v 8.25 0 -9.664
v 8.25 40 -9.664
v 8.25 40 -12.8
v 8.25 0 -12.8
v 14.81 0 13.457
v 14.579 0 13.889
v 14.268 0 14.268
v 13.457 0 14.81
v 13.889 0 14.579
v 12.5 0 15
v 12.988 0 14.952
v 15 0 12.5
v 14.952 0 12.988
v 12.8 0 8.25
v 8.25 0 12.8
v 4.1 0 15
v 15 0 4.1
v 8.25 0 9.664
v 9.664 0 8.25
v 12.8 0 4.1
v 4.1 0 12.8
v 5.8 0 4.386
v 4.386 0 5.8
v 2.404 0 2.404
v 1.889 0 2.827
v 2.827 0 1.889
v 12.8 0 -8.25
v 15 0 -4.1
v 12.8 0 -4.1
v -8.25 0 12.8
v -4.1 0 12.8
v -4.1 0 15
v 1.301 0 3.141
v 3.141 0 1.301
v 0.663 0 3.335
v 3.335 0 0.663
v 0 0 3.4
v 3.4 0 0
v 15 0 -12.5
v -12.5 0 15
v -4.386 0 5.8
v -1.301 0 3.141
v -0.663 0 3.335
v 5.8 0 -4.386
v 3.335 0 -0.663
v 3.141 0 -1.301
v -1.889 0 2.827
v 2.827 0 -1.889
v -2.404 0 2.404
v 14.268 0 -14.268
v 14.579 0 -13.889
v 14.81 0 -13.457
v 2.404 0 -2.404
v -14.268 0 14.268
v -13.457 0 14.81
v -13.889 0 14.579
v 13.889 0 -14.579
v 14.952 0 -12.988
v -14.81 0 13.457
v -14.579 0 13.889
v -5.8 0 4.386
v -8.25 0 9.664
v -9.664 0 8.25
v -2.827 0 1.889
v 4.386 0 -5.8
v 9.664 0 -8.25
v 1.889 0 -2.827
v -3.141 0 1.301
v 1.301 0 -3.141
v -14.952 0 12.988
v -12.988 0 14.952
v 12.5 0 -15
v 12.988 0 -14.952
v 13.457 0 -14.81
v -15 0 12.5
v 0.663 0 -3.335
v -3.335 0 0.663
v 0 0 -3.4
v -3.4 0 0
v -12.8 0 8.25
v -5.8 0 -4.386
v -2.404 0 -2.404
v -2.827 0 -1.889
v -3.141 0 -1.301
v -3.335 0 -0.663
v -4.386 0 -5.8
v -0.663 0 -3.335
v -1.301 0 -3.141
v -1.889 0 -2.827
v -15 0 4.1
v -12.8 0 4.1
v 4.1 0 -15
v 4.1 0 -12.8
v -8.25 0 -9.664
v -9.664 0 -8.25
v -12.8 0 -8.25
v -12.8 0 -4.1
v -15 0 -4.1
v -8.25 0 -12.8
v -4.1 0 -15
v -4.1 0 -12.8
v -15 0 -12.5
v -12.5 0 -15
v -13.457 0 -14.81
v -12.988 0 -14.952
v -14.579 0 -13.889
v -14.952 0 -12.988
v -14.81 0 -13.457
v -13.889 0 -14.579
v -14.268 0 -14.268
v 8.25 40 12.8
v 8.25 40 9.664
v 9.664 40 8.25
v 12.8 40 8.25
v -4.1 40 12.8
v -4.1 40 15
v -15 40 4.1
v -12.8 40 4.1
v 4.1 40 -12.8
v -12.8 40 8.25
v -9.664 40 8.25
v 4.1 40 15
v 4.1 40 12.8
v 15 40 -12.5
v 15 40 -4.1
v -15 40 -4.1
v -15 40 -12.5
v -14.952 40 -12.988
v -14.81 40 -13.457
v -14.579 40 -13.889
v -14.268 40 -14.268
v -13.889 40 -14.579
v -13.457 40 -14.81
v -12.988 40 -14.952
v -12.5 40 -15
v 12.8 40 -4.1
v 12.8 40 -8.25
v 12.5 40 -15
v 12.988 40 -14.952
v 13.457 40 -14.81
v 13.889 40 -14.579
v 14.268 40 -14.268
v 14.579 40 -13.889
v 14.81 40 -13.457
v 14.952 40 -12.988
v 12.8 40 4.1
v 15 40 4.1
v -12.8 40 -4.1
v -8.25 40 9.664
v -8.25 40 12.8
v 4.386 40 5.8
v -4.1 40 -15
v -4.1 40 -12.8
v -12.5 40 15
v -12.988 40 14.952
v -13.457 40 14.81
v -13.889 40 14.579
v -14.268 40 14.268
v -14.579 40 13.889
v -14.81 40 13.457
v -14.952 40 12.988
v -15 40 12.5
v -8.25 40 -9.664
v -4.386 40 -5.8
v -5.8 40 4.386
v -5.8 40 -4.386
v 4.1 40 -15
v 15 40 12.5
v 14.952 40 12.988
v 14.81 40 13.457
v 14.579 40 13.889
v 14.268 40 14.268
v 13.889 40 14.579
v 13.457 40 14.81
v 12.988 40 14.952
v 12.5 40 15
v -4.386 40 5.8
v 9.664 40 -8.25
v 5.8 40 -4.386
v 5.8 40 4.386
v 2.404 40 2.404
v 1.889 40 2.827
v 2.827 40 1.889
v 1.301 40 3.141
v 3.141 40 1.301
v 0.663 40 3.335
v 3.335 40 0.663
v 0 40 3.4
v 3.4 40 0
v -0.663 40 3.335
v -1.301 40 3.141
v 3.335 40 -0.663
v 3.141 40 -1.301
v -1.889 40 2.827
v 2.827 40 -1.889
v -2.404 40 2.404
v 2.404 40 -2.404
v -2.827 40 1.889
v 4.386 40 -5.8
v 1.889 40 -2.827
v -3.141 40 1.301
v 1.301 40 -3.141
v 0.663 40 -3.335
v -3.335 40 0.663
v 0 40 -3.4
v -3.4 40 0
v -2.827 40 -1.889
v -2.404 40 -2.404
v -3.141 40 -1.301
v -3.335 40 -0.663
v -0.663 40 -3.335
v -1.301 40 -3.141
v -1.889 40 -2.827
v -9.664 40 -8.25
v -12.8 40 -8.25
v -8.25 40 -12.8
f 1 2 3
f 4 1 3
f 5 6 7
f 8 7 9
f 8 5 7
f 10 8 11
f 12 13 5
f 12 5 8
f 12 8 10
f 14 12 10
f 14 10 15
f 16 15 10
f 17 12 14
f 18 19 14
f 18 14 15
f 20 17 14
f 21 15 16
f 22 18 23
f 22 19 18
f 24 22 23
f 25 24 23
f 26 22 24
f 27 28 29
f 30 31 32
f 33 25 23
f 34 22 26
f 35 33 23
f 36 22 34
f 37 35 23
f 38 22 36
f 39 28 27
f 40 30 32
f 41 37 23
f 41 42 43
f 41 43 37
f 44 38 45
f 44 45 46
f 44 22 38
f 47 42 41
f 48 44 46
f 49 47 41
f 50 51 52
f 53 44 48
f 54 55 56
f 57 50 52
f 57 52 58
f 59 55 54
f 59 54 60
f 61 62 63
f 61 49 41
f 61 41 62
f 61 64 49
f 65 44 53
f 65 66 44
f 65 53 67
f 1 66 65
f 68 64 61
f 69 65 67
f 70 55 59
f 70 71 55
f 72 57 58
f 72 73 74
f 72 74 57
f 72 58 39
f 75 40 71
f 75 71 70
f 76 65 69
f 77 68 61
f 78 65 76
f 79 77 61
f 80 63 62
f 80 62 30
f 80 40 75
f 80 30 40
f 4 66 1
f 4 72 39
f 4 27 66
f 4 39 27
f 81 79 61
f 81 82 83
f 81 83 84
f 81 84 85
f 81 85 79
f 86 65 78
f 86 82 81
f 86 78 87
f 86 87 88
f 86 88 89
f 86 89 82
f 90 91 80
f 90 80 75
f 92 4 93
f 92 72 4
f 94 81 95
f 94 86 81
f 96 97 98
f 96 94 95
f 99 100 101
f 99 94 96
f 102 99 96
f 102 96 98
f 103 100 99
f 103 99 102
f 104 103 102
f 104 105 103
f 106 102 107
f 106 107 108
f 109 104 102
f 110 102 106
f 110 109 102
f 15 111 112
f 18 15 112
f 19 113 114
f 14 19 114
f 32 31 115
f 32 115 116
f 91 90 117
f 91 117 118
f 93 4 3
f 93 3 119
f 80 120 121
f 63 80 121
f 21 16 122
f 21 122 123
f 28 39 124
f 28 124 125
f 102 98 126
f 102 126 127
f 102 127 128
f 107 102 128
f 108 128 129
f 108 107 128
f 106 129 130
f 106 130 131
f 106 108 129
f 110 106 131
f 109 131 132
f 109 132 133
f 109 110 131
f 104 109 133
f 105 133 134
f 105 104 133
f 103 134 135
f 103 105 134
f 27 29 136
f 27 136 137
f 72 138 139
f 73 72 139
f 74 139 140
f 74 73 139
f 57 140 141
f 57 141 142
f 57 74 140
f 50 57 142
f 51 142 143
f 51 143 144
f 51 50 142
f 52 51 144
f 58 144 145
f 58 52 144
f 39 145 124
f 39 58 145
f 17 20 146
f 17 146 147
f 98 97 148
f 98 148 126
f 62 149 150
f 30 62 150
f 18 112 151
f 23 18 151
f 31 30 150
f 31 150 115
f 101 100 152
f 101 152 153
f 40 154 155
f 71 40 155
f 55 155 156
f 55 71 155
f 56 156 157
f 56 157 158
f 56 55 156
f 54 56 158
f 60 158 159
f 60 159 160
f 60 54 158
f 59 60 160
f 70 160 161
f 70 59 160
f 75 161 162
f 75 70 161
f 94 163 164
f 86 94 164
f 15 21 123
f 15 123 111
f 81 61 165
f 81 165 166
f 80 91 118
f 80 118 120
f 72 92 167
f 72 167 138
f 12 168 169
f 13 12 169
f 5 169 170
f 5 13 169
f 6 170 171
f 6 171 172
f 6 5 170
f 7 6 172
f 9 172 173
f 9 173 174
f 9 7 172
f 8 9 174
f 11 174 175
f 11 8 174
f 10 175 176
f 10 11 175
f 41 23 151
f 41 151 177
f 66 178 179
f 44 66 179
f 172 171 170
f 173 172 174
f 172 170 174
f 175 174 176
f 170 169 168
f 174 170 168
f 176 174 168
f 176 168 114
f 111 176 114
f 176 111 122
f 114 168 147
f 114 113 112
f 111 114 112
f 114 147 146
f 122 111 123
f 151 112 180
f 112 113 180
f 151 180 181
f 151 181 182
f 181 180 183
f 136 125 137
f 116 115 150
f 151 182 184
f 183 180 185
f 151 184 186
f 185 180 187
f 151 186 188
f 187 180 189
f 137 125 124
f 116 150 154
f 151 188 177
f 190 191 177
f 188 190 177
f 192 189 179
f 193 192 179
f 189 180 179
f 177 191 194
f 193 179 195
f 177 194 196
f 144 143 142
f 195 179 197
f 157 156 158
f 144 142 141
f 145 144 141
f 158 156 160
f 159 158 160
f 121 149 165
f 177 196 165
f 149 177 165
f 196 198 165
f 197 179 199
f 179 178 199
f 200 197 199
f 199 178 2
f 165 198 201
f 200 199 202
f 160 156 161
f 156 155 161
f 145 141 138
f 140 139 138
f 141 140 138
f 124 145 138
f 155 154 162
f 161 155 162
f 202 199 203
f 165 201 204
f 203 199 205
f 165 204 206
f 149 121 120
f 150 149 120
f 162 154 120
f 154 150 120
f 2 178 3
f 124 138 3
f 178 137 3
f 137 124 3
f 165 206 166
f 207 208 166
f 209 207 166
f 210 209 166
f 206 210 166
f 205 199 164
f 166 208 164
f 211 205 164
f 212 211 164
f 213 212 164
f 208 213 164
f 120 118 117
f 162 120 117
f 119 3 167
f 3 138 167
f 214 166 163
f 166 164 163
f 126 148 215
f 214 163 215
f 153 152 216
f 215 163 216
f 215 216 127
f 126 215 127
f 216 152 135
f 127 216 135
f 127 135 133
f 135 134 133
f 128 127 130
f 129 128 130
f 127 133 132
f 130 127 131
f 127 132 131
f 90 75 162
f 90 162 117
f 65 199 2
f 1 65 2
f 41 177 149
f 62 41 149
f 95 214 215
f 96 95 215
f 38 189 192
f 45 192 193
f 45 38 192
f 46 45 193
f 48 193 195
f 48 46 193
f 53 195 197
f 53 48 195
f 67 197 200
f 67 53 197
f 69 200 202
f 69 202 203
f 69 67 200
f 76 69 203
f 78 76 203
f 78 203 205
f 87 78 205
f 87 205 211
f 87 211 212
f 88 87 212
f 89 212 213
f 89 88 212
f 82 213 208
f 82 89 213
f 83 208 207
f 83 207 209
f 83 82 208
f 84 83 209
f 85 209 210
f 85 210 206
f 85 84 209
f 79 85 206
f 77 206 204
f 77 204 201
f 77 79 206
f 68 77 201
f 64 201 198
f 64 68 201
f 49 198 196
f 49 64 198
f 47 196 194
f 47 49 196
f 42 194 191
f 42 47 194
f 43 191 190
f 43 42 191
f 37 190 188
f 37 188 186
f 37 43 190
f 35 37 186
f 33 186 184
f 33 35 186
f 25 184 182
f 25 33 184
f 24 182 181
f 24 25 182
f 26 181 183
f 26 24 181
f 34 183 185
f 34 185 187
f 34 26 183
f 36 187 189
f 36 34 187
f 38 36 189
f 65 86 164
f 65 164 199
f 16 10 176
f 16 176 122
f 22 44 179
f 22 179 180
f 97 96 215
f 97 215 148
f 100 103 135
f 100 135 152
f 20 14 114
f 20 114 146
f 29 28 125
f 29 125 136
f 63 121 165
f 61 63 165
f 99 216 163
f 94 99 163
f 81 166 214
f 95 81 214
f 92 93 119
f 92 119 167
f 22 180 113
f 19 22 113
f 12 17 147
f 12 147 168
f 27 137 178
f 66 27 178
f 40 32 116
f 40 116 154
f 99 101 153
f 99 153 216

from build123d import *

# Parameters (mm, degrees)
SKETCH1_R           = 3.4
BOSS_EXTRUDE1_DEPTH = 40


with BuildPart() as part:
    # Sketch1 → Boss-Extrude1 (new body)
    with BuildSketch(Plane(origin=(0, 0, 0), x_dir=(1, 0, 0), z_dir=(0, 1, 0))):
        with BuildLine():
            Line((5.8, 4.385786438), (5.8, -4.385786438))
            Line((5.8, -4.385786438), (9.664213562, -8.25))
            Line((9.664213562, -8.25), (12.8, -8.25))
            Line((12.8, -8.25), (12.8, -4.1))
            Line((12.8, -4.1), (15, -4.1))
            Line((15, -4.1), (15, -12.5))
            ThreePointArc((15, -12.5), (14.267766953, -14.267766953), (12.5, -15))
            Line((12.5, -15), (4.1, -15))
            Line((4.1, -15), (4.1, -12.8))
            Line((4.1, -12.8), (8.25, -12.8))
            Line((8.25, -12.8), (8.25, -9.664213562))
            Line((8.25, -9.664213562), (4.385786438, -5.8))
            Line((4.385786438, -5.8), (-4.385786438, -5.8))
            Line((-4.385786438, -5.8), (-8.25, -9.664213562))
            Line((-8.25, -9.664213562), (-8.25, -12.8))
            Line((-8.25, -12.8), (-4.1, -12.8))
            Line((-4.1, -12.8), (-4.1, -15))
            Line((-4.1, -15), (-12.5, -15))
            ThreePointArc((-12.5, -15), (-14.267766953, -14.267766953), (-15, -12.5))
            Line((-15, -12.5), (-15, -4.1))
            Line((-15, -4.1), (-12.8, -4.1))
            Line((-12.8, -4.1), (-12.8, -8.25))
            Line((-12.8, -8.25), (-9.664213562, -8.25))
            Line((-9.664213562, -8.25), (-5.8, -4.385786438))
            Line((-5.8, -4.385786438), (-5.8, 4.385786438))
            Line((-5.8, 4.385786438), (-9.664213562, 8.25))
            Line((-9.664213562, 8.25), (-12.8, 8.25))
            Line((-12.8, 8.25), (-12.8, 4.1))
            Line((-12.8, 4.1), (-15, 4.1))
            Line((-15, 4.1), (-15, 12.5))
            ThreePointArc((-15, 12.5), (-14.267766953, 14.267766953), (-12.5, 15))
            Line((-12.5, 15), (-4.1, 15))
            Line((-4.1, 15), (-4.1, 12.8))
            Line((-4.1, 12.8), (-8.25, 12.8))
            Line((-8.25, 12.8), (-8.25, 9.664213562))
            Line((-8.25, 9.664213562), (-4.385786438, 5.8))
            Line((-4.385786438, 5.8), (4.385786438, 5.8))
            Line((4.385786438, 5.8), (8.25, 9.664213562))
            Line((8.25, 9.664213562), (8.25, 12.8))
            Line((8.25, 12.8), (4.1, 12.8))
            Line((4.1, 12.8), (4.1, 15))
            Line((4.1, 15), (12.5, 15))
            ThreePointArc((12.5, 15), (14.267766953, 14.267766953), (15, 12.5))
            Line((15, 12.5), (15, 4.1))
            Line((15, 4.1), (12.8, 4.1))
            Line((12.8, 4.1), (12.8, 8.25))
            Line((12.8, 8.25), (9.664213562, 8.25))
            Line((9.664213562, 8.25), (5.8, 4.385786438))
        make_face()
        Circle(SKETCH1_R, mode=Mode.SUBTRACT)
    extrude(amount=BOSS_EXTRUDE1_DEPTH)


solid = part.part
